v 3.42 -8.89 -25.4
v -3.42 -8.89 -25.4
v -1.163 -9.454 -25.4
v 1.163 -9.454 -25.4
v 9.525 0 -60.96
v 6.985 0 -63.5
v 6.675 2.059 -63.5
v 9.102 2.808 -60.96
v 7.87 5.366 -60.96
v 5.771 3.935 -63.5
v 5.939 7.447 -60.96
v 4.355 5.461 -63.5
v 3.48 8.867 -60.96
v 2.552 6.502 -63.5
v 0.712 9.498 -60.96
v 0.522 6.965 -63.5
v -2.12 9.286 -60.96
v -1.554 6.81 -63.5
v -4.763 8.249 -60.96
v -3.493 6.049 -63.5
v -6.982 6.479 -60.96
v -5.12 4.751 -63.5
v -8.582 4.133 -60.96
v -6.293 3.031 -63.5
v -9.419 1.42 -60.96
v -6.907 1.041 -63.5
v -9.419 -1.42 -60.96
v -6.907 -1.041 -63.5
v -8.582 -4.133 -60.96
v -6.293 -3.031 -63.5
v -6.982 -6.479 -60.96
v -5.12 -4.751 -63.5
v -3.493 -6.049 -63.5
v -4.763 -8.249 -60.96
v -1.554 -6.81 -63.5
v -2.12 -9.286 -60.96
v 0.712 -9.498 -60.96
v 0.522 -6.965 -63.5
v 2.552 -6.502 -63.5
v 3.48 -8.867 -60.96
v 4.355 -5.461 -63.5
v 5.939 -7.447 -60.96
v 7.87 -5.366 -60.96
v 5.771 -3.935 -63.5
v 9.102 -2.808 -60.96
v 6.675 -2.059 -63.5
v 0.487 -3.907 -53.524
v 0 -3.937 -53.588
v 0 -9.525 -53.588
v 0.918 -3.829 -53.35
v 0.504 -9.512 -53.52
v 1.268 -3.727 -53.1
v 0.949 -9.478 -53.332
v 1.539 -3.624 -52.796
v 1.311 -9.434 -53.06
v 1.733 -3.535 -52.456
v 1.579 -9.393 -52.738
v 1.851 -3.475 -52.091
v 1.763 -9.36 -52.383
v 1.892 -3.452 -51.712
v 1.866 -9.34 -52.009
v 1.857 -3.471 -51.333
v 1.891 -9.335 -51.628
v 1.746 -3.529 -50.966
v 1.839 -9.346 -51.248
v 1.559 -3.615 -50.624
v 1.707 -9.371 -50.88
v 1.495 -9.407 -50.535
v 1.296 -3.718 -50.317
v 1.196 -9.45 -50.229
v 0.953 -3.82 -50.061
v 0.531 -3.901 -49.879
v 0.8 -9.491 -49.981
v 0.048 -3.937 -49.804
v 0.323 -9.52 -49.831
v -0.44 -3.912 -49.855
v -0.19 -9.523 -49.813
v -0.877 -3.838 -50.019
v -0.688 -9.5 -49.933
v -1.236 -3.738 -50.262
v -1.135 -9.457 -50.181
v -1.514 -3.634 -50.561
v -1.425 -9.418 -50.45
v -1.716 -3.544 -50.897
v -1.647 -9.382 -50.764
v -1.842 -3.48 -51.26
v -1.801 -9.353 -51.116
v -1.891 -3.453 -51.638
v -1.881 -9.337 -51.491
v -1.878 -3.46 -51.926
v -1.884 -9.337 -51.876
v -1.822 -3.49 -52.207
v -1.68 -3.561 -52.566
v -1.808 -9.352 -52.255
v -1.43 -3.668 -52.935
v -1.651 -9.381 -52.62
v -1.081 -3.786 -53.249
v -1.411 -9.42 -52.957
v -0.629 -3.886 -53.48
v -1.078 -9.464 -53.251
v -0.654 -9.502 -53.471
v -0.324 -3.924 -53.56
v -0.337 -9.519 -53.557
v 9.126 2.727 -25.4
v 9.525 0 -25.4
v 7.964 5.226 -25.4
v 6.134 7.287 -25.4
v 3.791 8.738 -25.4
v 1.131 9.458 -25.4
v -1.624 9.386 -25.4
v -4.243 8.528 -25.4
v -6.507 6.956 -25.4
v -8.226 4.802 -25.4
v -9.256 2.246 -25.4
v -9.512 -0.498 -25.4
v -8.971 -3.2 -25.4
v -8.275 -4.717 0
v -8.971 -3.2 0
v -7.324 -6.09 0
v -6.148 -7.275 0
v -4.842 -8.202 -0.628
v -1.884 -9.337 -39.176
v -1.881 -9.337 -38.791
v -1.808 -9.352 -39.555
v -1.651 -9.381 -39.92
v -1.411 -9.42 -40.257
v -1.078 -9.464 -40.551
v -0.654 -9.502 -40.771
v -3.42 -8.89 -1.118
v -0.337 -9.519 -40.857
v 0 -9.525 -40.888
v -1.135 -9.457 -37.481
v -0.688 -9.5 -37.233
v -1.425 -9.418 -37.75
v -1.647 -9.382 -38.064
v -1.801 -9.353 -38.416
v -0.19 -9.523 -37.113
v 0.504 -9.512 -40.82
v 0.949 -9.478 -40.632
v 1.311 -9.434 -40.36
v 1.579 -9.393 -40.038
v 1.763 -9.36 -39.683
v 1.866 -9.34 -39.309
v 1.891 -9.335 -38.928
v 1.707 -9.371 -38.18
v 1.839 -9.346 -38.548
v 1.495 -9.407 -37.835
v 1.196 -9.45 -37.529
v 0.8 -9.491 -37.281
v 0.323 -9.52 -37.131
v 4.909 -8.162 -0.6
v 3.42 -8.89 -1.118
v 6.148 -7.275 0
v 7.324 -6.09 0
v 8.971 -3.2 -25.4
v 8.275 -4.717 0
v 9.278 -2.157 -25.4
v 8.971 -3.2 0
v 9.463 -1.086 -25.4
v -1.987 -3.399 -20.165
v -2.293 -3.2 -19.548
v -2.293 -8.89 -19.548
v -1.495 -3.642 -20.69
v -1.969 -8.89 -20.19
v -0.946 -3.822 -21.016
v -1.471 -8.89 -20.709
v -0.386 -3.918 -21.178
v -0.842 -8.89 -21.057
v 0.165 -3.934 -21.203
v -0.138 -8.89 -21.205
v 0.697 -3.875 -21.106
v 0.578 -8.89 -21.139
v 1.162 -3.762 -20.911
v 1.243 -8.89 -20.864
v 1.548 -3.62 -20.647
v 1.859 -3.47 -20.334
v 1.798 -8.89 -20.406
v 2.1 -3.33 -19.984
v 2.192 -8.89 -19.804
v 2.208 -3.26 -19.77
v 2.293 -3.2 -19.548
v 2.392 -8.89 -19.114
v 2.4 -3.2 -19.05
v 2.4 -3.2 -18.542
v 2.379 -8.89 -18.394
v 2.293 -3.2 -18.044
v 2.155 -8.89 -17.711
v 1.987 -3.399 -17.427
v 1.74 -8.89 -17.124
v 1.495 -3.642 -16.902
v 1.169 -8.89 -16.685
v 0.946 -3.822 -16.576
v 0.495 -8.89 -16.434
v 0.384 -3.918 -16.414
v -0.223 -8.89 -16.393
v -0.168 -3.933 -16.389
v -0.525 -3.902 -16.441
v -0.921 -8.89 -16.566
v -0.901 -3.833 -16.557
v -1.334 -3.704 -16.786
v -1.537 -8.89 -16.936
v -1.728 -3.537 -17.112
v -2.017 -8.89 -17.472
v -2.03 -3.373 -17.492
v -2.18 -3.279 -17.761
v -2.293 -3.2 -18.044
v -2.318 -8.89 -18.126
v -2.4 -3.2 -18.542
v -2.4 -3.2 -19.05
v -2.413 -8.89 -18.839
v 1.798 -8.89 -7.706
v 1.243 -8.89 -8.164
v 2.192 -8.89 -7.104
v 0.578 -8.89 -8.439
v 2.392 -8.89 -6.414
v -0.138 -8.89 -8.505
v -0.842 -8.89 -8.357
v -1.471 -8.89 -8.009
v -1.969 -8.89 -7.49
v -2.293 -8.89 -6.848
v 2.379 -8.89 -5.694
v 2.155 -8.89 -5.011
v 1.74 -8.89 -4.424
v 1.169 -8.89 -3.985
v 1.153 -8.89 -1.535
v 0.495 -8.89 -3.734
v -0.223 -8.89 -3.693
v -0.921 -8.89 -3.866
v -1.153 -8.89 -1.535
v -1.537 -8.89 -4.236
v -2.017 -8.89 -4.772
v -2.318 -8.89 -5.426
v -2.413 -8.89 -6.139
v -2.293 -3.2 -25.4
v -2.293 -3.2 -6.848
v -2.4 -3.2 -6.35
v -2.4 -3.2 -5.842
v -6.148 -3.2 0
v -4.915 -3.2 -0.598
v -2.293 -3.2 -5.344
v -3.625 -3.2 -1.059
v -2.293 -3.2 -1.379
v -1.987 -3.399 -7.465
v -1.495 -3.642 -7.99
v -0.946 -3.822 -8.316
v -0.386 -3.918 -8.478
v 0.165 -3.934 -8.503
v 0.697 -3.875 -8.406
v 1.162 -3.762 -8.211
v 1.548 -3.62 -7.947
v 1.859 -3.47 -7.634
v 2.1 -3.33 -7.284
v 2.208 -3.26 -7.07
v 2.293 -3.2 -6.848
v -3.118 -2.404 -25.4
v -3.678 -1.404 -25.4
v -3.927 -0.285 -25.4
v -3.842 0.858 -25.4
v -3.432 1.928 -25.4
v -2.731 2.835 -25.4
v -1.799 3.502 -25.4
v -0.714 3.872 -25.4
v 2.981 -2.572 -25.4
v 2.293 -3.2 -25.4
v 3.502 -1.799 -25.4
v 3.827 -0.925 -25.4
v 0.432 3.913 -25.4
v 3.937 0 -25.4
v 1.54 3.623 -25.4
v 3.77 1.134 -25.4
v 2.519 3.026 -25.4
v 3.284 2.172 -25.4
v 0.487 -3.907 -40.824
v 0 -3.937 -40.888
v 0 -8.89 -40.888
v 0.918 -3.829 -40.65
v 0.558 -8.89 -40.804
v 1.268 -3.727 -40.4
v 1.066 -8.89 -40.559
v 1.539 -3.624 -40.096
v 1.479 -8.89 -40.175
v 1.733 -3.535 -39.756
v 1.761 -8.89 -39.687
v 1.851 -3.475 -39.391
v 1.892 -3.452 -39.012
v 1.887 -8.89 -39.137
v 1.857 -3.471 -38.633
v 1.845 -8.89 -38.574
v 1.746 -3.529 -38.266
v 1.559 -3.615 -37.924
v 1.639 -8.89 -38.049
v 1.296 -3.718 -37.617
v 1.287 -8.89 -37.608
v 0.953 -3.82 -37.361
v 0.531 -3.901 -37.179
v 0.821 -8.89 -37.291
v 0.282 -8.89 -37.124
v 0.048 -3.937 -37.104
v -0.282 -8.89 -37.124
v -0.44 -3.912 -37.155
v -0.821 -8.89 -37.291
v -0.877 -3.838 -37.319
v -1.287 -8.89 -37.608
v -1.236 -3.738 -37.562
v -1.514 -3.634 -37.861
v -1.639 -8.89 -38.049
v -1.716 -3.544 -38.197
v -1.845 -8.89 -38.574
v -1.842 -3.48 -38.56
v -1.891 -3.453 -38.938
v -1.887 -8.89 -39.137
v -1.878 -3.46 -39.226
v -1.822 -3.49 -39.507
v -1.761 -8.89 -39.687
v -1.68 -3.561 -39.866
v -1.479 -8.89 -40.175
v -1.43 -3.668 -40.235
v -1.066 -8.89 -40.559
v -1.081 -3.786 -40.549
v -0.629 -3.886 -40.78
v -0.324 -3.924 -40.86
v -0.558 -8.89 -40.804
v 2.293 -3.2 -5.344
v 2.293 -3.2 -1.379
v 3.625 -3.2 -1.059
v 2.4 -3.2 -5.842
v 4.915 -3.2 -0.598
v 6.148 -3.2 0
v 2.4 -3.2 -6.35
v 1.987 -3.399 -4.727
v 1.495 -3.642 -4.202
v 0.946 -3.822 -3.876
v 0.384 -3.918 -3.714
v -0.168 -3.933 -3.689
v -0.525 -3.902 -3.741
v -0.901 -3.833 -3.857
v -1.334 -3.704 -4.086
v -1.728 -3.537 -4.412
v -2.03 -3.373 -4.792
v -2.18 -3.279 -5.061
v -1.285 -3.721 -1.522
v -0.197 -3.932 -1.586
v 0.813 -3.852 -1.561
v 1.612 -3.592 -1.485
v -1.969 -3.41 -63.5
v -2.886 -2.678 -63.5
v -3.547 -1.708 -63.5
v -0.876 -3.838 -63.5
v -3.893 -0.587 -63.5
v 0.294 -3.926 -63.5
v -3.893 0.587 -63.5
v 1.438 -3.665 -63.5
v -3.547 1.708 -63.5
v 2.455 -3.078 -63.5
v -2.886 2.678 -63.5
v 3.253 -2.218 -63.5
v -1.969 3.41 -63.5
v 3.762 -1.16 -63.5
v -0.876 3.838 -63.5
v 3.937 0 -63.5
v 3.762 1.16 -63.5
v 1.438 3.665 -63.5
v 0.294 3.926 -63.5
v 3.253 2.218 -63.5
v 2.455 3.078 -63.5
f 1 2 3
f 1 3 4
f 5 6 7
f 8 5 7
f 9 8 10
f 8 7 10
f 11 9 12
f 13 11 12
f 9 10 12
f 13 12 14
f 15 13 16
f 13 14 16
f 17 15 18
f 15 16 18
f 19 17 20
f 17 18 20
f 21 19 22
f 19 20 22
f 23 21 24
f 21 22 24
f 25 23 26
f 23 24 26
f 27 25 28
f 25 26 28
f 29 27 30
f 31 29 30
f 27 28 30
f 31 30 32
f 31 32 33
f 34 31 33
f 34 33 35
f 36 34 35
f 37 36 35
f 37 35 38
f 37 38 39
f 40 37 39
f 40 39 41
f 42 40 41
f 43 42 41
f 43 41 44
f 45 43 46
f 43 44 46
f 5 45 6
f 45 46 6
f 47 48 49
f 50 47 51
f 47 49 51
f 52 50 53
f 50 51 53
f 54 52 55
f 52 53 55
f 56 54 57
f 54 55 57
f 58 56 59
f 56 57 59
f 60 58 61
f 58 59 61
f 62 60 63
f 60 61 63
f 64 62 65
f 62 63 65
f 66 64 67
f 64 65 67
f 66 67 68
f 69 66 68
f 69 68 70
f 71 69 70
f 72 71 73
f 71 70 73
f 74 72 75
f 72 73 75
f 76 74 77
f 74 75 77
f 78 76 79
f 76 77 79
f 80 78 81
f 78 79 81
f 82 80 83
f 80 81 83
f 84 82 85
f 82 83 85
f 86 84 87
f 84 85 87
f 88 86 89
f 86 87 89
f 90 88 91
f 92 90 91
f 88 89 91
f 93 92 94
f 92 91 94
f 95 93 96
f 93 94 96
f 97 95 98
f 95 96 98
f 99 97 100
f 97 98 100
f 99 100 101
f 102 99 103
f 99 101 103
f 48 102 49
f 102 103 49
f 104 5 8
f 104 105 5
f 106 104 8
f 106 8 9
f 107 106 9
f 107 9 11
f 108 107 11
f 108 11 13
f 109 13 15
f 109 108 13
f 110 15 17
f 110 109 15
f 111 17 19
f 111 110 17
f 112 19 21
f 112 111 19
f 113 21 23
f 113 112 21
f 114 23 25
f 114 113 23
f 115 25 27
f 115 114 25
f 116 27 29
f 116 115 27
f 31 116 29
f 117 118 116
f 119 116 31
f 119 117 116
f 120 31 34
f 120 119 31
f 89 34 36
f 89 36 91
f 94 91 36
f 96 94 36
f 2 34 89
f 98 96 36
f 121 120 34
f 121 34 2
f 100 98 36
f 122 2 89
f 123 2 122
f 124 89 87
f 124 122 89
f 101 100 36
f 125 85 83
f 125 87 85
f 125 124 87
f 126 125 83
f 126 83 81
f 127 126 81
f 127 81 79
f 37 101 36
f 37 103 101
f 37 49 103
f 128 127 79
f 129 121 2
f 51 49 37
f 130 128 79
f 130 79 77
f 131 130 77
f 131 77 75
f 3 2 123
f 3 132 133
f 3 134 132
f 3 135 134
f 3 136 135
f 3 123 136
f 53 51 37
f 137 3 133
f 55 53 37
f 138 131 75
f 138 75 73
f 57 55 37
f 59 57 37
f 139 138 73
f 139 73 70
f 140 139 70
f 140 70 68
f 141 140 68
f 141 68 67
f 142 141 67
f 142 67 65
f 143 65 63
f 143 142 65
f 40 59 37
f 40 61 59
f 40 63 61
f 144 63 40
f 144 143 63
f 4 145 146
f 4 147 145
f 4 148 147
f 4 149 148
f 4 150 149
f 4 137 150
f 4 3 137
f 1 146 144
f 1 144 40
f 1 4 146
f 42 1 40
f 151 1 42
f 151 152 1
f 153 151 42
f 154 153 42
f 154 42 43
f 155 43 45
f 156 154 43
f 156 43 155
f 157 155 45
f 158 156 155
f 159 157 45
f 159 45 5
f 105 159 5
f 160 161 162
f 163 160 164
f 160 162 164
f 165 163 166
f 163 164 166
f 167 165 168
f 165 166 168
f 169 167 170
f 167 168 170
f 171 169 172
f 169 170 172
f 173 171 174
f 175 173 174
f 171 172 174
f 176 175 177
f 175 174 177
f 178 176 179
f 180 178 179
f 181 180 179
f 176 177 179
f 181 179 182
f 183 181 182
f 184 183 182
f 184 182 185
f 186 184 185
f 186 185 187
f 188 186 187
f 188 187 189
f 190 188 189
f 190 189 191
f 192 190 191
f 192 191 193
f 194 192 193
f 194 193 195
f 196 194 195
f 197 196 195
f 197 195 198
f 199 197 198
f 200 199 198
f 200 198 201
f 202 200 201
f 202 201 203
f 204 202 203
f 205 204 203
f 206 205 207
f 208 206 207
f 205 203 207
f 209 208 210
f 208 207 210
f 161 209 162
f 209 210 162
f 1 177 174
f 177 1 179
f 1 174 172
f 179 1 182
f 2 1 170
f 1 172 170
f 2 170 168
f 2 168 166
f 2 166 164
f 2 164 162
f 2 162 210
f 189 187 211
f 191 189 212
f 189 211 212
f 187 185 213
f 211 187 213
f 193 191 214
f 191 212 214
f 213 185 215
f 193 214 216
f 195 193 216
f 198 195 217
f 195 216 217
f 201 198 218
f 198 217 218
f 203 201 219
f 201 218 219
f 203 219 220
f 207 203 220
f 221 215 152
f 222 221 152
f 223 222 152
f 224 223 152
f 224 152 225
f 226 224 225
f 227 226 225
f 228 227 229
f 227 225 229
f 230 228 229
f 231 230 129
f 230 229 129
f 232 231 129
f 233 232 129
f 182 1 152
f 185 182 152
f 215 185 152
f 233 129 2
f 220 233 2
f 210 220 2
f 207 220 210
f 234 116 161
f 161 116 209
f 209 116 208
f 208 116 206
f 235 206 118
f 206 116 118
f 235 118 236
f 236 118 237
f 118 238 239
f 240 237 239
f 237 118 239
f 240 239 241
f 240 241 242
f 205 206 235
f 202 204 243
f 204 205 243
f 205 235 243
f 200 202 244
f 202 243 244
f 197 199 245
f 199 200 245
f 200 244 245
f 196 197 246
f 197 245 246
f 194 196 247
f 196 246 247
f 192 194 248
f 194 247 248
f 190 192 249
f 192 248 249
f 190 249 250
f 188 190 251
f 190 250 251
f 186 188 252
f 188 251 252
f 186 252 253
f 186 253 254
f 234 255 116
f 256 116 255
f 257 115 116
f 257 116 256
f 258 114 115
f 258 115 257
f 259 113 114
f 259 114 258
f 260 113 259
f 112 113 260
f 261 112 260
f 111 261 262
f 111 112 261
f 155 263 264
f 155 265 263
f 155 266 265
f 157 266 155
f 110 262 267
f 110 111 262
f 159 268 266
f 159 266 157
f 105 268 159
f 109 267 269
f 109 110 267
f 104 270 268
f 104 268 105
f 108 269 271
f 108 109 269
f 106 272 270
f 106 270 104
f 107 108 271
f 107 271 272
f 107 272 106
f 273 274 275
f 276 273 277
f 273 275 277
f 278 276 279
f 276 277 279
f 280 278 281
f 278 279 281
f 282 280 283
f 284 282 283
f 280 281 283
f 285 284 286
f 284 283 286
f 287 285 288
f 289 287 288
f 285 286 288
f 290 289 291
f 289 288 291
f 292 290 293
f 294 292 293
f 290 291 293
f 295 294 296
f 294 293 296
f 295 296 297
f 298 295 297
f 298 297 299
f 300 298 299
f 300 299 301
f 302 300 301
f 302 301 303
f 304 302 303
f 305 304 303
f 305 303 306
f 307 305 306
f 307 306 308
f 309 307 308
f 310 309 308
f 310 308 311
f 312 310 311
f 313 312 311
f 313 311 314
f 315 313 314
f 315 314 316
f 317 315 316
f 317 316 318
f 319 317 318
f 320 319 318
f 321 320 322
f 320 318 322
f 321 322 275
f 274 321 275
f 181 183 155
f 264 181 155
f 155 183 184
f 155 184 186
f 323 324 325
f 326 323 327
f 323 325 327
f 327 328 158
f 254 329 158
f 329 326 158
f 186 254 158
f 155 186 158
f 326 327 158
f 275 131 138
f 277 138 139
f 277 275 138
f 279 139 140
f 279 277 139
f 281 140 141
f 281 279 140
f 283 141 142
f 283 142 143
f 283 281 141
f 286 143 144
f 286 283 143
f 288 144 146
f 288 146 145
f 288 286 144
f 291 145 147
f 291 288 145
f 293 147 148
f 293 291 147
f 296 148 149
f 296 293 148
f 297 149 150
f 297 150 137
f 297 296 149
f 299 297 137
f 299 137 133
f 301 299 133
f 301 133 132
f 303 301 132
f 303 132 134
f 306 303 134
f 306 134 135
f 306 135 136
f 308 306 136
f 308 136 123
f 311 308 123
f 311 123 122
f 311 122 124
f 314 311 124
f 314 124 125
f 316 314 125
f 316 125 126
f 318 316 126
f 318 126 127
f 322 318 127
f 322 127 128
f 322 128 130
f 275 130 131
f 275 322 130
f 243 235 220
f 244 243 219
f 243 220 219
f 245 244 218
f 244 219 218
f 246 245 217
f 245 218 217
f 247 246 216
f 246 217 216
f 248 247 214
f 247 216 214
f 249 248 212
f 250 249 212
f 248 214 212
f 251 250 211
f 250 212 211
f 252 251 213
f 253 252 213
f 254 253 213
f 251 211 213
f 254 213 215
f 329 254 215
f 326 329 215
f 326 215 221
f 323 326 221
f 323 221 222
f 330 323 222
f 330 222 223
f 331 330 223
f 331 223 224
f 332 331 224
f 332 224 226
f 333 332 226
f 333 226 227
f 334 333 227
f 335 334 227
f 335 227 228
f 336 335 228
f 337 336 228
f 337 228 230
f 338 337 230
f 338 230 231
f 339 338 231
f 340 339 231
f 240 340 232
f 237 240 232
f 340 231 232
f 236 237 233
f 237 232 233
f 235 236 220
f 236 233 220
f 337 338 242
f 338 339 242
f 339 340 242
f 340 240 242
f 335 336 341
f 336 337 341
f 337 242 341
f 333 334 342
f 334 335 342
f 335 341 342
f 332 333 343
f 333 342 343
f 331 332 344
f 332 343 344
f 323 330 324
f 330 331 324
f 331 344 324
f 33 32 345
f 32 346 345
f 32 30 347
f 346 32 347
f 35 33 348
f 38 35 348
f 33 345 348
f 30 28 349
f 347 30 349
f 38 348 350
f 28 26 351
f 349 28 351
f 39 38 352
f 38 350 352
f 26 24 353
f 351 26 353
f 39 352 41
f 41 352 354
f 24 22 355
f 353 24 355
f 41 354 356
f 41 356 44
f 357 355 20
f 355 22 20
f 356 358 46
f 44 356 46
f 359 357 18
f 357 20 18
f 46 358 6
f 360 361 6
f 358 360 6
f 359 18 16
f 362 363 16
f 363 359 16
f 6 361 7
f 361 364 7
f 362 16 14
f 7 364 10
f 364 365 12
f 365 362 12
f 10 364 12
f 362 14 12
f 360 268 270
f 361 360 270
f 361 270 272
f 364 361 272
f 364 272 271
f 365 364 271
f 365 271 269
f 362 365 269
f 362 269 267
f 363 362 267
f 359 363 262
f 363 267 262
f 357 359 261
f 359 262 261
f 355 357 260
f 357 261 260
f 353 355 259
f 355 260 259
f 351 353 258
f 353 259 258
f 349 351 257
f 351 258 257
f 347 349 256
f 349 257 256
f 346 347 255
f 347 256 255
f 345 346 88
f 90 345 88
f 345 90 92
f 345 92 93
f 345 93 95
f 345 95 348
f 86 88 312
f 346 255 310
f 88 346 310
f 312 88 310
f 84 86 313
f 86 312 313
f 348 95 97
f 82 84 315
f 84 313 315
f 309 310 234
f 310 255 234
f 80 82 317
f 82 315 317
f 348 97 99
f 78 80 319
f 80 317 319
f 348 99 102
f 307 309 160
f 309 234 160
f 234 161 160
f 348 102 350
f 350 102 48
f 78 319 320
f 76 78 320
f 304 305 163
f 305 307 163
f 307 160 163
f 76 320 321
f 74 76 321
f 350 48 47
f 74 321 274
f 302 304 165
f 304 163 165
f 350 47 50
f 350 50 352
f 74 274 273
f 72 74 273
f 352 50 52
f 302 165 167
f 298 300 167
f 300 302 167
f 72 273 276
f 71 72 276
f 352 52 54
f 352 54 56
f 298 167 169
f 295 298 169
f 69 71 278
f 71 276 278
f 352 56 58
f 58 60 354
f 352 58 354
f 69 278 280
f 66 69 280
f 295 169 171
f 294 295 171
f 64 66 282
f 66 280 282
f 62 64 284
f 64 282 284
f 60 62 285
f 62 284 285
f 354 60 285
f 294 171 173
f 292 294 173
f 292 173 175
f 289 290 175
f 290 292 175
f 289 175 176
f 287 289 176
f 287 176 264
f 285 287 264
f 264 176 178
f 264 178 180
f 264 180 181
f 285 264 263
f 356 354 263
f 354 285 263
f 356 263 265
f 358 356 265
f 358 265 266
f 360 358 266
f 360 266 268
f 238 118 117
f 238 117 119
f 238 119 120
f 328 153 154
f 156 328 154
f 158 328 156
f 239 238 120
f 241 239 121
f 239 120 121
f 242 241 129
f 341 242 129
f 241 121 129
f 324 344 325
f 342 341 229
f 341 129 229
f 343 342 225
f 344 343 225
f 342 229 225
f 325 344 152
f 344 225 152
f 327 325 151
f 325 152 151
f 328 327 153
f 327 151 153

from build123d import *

# Parameters (mm, degrees)
SKETCH1_R          = 9.525
SKETCH1_R_2        = 3.937
EXTRUDE1_DEPTH     = 63.5
CUT_EXTRUDE1_DEPTH = 25.4
CUT_EXTRUDE2_DEPTH = 25.4
SKETCH4_R          = 2.413
SKETCH4_R_2        = 1.8923
CUT_EXTRUDE3_DEPTH = 6.35
CHAMFER2_SIZE      = 2.54
SKETCH5_R          = 12.7
CUT_EXTRUDE4_DEPTH = 67.79886128


with BuildPart() as part:
    # Sketch1 → Extrude1 (new body)
    with BuildSketch(Plane.XY):
        Circle(SKETCH1_R)
        Circle(SKETCH1_R_2, mode=Mode.SUBTRACT)
    extrude(amount=-EXTRUDE1_DEPTH)

    # Sketch2 → Cut-Extrude1 (cut)
    with BuildSketch(Plane.XY):
        with BuildLine():
            Line((-9.525, -3.2004), (9.525, -3.2004))
            Line((9.525, -3.2004), (9.525, 3.2004))
            ThreePointArc((9.525, 3.2004), (0, 10.329891018), (-9.525, 3.2004))
            Line((-9.525, 3.2004), (-9.525, -3.2004))
        make_face()
    extrude(amount=-CUT_EXTRUDE1_DEPTH, mode=Mode.SUBTRACT)

    # Sketch3 → Cut-Extrude2 (cut)
    with BuildSketch(Plane.XY):
        Polygon((0, -9.525), (6.594230769, -9.525), (6.594230769, -8.89), (-6.187179487, -8.89), (-6.187179487, -9.525), align=None)
    extrude(amount=-CUT_EXTRUDE2_DEPTH, mode=Mode.SUBTRACT)

    # Sketch4 → Cut-Extrude3 (cut, symmetric)
    with BuildSketch(Plane.XZ.offset(8.89)):
        with Locations(Location((0, -6.096, 0), (0, 0, 198.152695479))):
            Circle(SKETCH4_R)
        with Locations(Location((0, -18.796, 0), (0, 0, 198.152695479))):
            Circle(SKETCH4_R)
        with Locations(Location((0, -38.995512821, 0), (0, 0, 270))):
            Circle(SKETCH4_R_2)
        with Locations(Location((0, -51.695512821, 0), (0, 0, 270))):
            Circle(SKETCH4_R_2)
    extrude(amount=CUT_EXTRUDE3_DEPTH, both=True, mode=Mode.SUBTRACT)

    # Chamfer2
    chamfer2_edges = [part.edges().sort_by_distance(p)[0] for p in [
        (-9.525, 0, -63.5),
    ]]
    chamfer(chamfer2_edges, length=CHAMFER2_SIZE)

    # Sketch5 → Cut-Extrude4 (cut, through all)
    with BuildSketch(Plane.XZ.offset(8.89)):
        with Locations((0, 11.1125)):
            Circle(SKETCH5_R)
    extrude(amount=-CUT_EXTRUDE4_DEPTH, mode=Mode.SUBTRACT)


solid = part.part
